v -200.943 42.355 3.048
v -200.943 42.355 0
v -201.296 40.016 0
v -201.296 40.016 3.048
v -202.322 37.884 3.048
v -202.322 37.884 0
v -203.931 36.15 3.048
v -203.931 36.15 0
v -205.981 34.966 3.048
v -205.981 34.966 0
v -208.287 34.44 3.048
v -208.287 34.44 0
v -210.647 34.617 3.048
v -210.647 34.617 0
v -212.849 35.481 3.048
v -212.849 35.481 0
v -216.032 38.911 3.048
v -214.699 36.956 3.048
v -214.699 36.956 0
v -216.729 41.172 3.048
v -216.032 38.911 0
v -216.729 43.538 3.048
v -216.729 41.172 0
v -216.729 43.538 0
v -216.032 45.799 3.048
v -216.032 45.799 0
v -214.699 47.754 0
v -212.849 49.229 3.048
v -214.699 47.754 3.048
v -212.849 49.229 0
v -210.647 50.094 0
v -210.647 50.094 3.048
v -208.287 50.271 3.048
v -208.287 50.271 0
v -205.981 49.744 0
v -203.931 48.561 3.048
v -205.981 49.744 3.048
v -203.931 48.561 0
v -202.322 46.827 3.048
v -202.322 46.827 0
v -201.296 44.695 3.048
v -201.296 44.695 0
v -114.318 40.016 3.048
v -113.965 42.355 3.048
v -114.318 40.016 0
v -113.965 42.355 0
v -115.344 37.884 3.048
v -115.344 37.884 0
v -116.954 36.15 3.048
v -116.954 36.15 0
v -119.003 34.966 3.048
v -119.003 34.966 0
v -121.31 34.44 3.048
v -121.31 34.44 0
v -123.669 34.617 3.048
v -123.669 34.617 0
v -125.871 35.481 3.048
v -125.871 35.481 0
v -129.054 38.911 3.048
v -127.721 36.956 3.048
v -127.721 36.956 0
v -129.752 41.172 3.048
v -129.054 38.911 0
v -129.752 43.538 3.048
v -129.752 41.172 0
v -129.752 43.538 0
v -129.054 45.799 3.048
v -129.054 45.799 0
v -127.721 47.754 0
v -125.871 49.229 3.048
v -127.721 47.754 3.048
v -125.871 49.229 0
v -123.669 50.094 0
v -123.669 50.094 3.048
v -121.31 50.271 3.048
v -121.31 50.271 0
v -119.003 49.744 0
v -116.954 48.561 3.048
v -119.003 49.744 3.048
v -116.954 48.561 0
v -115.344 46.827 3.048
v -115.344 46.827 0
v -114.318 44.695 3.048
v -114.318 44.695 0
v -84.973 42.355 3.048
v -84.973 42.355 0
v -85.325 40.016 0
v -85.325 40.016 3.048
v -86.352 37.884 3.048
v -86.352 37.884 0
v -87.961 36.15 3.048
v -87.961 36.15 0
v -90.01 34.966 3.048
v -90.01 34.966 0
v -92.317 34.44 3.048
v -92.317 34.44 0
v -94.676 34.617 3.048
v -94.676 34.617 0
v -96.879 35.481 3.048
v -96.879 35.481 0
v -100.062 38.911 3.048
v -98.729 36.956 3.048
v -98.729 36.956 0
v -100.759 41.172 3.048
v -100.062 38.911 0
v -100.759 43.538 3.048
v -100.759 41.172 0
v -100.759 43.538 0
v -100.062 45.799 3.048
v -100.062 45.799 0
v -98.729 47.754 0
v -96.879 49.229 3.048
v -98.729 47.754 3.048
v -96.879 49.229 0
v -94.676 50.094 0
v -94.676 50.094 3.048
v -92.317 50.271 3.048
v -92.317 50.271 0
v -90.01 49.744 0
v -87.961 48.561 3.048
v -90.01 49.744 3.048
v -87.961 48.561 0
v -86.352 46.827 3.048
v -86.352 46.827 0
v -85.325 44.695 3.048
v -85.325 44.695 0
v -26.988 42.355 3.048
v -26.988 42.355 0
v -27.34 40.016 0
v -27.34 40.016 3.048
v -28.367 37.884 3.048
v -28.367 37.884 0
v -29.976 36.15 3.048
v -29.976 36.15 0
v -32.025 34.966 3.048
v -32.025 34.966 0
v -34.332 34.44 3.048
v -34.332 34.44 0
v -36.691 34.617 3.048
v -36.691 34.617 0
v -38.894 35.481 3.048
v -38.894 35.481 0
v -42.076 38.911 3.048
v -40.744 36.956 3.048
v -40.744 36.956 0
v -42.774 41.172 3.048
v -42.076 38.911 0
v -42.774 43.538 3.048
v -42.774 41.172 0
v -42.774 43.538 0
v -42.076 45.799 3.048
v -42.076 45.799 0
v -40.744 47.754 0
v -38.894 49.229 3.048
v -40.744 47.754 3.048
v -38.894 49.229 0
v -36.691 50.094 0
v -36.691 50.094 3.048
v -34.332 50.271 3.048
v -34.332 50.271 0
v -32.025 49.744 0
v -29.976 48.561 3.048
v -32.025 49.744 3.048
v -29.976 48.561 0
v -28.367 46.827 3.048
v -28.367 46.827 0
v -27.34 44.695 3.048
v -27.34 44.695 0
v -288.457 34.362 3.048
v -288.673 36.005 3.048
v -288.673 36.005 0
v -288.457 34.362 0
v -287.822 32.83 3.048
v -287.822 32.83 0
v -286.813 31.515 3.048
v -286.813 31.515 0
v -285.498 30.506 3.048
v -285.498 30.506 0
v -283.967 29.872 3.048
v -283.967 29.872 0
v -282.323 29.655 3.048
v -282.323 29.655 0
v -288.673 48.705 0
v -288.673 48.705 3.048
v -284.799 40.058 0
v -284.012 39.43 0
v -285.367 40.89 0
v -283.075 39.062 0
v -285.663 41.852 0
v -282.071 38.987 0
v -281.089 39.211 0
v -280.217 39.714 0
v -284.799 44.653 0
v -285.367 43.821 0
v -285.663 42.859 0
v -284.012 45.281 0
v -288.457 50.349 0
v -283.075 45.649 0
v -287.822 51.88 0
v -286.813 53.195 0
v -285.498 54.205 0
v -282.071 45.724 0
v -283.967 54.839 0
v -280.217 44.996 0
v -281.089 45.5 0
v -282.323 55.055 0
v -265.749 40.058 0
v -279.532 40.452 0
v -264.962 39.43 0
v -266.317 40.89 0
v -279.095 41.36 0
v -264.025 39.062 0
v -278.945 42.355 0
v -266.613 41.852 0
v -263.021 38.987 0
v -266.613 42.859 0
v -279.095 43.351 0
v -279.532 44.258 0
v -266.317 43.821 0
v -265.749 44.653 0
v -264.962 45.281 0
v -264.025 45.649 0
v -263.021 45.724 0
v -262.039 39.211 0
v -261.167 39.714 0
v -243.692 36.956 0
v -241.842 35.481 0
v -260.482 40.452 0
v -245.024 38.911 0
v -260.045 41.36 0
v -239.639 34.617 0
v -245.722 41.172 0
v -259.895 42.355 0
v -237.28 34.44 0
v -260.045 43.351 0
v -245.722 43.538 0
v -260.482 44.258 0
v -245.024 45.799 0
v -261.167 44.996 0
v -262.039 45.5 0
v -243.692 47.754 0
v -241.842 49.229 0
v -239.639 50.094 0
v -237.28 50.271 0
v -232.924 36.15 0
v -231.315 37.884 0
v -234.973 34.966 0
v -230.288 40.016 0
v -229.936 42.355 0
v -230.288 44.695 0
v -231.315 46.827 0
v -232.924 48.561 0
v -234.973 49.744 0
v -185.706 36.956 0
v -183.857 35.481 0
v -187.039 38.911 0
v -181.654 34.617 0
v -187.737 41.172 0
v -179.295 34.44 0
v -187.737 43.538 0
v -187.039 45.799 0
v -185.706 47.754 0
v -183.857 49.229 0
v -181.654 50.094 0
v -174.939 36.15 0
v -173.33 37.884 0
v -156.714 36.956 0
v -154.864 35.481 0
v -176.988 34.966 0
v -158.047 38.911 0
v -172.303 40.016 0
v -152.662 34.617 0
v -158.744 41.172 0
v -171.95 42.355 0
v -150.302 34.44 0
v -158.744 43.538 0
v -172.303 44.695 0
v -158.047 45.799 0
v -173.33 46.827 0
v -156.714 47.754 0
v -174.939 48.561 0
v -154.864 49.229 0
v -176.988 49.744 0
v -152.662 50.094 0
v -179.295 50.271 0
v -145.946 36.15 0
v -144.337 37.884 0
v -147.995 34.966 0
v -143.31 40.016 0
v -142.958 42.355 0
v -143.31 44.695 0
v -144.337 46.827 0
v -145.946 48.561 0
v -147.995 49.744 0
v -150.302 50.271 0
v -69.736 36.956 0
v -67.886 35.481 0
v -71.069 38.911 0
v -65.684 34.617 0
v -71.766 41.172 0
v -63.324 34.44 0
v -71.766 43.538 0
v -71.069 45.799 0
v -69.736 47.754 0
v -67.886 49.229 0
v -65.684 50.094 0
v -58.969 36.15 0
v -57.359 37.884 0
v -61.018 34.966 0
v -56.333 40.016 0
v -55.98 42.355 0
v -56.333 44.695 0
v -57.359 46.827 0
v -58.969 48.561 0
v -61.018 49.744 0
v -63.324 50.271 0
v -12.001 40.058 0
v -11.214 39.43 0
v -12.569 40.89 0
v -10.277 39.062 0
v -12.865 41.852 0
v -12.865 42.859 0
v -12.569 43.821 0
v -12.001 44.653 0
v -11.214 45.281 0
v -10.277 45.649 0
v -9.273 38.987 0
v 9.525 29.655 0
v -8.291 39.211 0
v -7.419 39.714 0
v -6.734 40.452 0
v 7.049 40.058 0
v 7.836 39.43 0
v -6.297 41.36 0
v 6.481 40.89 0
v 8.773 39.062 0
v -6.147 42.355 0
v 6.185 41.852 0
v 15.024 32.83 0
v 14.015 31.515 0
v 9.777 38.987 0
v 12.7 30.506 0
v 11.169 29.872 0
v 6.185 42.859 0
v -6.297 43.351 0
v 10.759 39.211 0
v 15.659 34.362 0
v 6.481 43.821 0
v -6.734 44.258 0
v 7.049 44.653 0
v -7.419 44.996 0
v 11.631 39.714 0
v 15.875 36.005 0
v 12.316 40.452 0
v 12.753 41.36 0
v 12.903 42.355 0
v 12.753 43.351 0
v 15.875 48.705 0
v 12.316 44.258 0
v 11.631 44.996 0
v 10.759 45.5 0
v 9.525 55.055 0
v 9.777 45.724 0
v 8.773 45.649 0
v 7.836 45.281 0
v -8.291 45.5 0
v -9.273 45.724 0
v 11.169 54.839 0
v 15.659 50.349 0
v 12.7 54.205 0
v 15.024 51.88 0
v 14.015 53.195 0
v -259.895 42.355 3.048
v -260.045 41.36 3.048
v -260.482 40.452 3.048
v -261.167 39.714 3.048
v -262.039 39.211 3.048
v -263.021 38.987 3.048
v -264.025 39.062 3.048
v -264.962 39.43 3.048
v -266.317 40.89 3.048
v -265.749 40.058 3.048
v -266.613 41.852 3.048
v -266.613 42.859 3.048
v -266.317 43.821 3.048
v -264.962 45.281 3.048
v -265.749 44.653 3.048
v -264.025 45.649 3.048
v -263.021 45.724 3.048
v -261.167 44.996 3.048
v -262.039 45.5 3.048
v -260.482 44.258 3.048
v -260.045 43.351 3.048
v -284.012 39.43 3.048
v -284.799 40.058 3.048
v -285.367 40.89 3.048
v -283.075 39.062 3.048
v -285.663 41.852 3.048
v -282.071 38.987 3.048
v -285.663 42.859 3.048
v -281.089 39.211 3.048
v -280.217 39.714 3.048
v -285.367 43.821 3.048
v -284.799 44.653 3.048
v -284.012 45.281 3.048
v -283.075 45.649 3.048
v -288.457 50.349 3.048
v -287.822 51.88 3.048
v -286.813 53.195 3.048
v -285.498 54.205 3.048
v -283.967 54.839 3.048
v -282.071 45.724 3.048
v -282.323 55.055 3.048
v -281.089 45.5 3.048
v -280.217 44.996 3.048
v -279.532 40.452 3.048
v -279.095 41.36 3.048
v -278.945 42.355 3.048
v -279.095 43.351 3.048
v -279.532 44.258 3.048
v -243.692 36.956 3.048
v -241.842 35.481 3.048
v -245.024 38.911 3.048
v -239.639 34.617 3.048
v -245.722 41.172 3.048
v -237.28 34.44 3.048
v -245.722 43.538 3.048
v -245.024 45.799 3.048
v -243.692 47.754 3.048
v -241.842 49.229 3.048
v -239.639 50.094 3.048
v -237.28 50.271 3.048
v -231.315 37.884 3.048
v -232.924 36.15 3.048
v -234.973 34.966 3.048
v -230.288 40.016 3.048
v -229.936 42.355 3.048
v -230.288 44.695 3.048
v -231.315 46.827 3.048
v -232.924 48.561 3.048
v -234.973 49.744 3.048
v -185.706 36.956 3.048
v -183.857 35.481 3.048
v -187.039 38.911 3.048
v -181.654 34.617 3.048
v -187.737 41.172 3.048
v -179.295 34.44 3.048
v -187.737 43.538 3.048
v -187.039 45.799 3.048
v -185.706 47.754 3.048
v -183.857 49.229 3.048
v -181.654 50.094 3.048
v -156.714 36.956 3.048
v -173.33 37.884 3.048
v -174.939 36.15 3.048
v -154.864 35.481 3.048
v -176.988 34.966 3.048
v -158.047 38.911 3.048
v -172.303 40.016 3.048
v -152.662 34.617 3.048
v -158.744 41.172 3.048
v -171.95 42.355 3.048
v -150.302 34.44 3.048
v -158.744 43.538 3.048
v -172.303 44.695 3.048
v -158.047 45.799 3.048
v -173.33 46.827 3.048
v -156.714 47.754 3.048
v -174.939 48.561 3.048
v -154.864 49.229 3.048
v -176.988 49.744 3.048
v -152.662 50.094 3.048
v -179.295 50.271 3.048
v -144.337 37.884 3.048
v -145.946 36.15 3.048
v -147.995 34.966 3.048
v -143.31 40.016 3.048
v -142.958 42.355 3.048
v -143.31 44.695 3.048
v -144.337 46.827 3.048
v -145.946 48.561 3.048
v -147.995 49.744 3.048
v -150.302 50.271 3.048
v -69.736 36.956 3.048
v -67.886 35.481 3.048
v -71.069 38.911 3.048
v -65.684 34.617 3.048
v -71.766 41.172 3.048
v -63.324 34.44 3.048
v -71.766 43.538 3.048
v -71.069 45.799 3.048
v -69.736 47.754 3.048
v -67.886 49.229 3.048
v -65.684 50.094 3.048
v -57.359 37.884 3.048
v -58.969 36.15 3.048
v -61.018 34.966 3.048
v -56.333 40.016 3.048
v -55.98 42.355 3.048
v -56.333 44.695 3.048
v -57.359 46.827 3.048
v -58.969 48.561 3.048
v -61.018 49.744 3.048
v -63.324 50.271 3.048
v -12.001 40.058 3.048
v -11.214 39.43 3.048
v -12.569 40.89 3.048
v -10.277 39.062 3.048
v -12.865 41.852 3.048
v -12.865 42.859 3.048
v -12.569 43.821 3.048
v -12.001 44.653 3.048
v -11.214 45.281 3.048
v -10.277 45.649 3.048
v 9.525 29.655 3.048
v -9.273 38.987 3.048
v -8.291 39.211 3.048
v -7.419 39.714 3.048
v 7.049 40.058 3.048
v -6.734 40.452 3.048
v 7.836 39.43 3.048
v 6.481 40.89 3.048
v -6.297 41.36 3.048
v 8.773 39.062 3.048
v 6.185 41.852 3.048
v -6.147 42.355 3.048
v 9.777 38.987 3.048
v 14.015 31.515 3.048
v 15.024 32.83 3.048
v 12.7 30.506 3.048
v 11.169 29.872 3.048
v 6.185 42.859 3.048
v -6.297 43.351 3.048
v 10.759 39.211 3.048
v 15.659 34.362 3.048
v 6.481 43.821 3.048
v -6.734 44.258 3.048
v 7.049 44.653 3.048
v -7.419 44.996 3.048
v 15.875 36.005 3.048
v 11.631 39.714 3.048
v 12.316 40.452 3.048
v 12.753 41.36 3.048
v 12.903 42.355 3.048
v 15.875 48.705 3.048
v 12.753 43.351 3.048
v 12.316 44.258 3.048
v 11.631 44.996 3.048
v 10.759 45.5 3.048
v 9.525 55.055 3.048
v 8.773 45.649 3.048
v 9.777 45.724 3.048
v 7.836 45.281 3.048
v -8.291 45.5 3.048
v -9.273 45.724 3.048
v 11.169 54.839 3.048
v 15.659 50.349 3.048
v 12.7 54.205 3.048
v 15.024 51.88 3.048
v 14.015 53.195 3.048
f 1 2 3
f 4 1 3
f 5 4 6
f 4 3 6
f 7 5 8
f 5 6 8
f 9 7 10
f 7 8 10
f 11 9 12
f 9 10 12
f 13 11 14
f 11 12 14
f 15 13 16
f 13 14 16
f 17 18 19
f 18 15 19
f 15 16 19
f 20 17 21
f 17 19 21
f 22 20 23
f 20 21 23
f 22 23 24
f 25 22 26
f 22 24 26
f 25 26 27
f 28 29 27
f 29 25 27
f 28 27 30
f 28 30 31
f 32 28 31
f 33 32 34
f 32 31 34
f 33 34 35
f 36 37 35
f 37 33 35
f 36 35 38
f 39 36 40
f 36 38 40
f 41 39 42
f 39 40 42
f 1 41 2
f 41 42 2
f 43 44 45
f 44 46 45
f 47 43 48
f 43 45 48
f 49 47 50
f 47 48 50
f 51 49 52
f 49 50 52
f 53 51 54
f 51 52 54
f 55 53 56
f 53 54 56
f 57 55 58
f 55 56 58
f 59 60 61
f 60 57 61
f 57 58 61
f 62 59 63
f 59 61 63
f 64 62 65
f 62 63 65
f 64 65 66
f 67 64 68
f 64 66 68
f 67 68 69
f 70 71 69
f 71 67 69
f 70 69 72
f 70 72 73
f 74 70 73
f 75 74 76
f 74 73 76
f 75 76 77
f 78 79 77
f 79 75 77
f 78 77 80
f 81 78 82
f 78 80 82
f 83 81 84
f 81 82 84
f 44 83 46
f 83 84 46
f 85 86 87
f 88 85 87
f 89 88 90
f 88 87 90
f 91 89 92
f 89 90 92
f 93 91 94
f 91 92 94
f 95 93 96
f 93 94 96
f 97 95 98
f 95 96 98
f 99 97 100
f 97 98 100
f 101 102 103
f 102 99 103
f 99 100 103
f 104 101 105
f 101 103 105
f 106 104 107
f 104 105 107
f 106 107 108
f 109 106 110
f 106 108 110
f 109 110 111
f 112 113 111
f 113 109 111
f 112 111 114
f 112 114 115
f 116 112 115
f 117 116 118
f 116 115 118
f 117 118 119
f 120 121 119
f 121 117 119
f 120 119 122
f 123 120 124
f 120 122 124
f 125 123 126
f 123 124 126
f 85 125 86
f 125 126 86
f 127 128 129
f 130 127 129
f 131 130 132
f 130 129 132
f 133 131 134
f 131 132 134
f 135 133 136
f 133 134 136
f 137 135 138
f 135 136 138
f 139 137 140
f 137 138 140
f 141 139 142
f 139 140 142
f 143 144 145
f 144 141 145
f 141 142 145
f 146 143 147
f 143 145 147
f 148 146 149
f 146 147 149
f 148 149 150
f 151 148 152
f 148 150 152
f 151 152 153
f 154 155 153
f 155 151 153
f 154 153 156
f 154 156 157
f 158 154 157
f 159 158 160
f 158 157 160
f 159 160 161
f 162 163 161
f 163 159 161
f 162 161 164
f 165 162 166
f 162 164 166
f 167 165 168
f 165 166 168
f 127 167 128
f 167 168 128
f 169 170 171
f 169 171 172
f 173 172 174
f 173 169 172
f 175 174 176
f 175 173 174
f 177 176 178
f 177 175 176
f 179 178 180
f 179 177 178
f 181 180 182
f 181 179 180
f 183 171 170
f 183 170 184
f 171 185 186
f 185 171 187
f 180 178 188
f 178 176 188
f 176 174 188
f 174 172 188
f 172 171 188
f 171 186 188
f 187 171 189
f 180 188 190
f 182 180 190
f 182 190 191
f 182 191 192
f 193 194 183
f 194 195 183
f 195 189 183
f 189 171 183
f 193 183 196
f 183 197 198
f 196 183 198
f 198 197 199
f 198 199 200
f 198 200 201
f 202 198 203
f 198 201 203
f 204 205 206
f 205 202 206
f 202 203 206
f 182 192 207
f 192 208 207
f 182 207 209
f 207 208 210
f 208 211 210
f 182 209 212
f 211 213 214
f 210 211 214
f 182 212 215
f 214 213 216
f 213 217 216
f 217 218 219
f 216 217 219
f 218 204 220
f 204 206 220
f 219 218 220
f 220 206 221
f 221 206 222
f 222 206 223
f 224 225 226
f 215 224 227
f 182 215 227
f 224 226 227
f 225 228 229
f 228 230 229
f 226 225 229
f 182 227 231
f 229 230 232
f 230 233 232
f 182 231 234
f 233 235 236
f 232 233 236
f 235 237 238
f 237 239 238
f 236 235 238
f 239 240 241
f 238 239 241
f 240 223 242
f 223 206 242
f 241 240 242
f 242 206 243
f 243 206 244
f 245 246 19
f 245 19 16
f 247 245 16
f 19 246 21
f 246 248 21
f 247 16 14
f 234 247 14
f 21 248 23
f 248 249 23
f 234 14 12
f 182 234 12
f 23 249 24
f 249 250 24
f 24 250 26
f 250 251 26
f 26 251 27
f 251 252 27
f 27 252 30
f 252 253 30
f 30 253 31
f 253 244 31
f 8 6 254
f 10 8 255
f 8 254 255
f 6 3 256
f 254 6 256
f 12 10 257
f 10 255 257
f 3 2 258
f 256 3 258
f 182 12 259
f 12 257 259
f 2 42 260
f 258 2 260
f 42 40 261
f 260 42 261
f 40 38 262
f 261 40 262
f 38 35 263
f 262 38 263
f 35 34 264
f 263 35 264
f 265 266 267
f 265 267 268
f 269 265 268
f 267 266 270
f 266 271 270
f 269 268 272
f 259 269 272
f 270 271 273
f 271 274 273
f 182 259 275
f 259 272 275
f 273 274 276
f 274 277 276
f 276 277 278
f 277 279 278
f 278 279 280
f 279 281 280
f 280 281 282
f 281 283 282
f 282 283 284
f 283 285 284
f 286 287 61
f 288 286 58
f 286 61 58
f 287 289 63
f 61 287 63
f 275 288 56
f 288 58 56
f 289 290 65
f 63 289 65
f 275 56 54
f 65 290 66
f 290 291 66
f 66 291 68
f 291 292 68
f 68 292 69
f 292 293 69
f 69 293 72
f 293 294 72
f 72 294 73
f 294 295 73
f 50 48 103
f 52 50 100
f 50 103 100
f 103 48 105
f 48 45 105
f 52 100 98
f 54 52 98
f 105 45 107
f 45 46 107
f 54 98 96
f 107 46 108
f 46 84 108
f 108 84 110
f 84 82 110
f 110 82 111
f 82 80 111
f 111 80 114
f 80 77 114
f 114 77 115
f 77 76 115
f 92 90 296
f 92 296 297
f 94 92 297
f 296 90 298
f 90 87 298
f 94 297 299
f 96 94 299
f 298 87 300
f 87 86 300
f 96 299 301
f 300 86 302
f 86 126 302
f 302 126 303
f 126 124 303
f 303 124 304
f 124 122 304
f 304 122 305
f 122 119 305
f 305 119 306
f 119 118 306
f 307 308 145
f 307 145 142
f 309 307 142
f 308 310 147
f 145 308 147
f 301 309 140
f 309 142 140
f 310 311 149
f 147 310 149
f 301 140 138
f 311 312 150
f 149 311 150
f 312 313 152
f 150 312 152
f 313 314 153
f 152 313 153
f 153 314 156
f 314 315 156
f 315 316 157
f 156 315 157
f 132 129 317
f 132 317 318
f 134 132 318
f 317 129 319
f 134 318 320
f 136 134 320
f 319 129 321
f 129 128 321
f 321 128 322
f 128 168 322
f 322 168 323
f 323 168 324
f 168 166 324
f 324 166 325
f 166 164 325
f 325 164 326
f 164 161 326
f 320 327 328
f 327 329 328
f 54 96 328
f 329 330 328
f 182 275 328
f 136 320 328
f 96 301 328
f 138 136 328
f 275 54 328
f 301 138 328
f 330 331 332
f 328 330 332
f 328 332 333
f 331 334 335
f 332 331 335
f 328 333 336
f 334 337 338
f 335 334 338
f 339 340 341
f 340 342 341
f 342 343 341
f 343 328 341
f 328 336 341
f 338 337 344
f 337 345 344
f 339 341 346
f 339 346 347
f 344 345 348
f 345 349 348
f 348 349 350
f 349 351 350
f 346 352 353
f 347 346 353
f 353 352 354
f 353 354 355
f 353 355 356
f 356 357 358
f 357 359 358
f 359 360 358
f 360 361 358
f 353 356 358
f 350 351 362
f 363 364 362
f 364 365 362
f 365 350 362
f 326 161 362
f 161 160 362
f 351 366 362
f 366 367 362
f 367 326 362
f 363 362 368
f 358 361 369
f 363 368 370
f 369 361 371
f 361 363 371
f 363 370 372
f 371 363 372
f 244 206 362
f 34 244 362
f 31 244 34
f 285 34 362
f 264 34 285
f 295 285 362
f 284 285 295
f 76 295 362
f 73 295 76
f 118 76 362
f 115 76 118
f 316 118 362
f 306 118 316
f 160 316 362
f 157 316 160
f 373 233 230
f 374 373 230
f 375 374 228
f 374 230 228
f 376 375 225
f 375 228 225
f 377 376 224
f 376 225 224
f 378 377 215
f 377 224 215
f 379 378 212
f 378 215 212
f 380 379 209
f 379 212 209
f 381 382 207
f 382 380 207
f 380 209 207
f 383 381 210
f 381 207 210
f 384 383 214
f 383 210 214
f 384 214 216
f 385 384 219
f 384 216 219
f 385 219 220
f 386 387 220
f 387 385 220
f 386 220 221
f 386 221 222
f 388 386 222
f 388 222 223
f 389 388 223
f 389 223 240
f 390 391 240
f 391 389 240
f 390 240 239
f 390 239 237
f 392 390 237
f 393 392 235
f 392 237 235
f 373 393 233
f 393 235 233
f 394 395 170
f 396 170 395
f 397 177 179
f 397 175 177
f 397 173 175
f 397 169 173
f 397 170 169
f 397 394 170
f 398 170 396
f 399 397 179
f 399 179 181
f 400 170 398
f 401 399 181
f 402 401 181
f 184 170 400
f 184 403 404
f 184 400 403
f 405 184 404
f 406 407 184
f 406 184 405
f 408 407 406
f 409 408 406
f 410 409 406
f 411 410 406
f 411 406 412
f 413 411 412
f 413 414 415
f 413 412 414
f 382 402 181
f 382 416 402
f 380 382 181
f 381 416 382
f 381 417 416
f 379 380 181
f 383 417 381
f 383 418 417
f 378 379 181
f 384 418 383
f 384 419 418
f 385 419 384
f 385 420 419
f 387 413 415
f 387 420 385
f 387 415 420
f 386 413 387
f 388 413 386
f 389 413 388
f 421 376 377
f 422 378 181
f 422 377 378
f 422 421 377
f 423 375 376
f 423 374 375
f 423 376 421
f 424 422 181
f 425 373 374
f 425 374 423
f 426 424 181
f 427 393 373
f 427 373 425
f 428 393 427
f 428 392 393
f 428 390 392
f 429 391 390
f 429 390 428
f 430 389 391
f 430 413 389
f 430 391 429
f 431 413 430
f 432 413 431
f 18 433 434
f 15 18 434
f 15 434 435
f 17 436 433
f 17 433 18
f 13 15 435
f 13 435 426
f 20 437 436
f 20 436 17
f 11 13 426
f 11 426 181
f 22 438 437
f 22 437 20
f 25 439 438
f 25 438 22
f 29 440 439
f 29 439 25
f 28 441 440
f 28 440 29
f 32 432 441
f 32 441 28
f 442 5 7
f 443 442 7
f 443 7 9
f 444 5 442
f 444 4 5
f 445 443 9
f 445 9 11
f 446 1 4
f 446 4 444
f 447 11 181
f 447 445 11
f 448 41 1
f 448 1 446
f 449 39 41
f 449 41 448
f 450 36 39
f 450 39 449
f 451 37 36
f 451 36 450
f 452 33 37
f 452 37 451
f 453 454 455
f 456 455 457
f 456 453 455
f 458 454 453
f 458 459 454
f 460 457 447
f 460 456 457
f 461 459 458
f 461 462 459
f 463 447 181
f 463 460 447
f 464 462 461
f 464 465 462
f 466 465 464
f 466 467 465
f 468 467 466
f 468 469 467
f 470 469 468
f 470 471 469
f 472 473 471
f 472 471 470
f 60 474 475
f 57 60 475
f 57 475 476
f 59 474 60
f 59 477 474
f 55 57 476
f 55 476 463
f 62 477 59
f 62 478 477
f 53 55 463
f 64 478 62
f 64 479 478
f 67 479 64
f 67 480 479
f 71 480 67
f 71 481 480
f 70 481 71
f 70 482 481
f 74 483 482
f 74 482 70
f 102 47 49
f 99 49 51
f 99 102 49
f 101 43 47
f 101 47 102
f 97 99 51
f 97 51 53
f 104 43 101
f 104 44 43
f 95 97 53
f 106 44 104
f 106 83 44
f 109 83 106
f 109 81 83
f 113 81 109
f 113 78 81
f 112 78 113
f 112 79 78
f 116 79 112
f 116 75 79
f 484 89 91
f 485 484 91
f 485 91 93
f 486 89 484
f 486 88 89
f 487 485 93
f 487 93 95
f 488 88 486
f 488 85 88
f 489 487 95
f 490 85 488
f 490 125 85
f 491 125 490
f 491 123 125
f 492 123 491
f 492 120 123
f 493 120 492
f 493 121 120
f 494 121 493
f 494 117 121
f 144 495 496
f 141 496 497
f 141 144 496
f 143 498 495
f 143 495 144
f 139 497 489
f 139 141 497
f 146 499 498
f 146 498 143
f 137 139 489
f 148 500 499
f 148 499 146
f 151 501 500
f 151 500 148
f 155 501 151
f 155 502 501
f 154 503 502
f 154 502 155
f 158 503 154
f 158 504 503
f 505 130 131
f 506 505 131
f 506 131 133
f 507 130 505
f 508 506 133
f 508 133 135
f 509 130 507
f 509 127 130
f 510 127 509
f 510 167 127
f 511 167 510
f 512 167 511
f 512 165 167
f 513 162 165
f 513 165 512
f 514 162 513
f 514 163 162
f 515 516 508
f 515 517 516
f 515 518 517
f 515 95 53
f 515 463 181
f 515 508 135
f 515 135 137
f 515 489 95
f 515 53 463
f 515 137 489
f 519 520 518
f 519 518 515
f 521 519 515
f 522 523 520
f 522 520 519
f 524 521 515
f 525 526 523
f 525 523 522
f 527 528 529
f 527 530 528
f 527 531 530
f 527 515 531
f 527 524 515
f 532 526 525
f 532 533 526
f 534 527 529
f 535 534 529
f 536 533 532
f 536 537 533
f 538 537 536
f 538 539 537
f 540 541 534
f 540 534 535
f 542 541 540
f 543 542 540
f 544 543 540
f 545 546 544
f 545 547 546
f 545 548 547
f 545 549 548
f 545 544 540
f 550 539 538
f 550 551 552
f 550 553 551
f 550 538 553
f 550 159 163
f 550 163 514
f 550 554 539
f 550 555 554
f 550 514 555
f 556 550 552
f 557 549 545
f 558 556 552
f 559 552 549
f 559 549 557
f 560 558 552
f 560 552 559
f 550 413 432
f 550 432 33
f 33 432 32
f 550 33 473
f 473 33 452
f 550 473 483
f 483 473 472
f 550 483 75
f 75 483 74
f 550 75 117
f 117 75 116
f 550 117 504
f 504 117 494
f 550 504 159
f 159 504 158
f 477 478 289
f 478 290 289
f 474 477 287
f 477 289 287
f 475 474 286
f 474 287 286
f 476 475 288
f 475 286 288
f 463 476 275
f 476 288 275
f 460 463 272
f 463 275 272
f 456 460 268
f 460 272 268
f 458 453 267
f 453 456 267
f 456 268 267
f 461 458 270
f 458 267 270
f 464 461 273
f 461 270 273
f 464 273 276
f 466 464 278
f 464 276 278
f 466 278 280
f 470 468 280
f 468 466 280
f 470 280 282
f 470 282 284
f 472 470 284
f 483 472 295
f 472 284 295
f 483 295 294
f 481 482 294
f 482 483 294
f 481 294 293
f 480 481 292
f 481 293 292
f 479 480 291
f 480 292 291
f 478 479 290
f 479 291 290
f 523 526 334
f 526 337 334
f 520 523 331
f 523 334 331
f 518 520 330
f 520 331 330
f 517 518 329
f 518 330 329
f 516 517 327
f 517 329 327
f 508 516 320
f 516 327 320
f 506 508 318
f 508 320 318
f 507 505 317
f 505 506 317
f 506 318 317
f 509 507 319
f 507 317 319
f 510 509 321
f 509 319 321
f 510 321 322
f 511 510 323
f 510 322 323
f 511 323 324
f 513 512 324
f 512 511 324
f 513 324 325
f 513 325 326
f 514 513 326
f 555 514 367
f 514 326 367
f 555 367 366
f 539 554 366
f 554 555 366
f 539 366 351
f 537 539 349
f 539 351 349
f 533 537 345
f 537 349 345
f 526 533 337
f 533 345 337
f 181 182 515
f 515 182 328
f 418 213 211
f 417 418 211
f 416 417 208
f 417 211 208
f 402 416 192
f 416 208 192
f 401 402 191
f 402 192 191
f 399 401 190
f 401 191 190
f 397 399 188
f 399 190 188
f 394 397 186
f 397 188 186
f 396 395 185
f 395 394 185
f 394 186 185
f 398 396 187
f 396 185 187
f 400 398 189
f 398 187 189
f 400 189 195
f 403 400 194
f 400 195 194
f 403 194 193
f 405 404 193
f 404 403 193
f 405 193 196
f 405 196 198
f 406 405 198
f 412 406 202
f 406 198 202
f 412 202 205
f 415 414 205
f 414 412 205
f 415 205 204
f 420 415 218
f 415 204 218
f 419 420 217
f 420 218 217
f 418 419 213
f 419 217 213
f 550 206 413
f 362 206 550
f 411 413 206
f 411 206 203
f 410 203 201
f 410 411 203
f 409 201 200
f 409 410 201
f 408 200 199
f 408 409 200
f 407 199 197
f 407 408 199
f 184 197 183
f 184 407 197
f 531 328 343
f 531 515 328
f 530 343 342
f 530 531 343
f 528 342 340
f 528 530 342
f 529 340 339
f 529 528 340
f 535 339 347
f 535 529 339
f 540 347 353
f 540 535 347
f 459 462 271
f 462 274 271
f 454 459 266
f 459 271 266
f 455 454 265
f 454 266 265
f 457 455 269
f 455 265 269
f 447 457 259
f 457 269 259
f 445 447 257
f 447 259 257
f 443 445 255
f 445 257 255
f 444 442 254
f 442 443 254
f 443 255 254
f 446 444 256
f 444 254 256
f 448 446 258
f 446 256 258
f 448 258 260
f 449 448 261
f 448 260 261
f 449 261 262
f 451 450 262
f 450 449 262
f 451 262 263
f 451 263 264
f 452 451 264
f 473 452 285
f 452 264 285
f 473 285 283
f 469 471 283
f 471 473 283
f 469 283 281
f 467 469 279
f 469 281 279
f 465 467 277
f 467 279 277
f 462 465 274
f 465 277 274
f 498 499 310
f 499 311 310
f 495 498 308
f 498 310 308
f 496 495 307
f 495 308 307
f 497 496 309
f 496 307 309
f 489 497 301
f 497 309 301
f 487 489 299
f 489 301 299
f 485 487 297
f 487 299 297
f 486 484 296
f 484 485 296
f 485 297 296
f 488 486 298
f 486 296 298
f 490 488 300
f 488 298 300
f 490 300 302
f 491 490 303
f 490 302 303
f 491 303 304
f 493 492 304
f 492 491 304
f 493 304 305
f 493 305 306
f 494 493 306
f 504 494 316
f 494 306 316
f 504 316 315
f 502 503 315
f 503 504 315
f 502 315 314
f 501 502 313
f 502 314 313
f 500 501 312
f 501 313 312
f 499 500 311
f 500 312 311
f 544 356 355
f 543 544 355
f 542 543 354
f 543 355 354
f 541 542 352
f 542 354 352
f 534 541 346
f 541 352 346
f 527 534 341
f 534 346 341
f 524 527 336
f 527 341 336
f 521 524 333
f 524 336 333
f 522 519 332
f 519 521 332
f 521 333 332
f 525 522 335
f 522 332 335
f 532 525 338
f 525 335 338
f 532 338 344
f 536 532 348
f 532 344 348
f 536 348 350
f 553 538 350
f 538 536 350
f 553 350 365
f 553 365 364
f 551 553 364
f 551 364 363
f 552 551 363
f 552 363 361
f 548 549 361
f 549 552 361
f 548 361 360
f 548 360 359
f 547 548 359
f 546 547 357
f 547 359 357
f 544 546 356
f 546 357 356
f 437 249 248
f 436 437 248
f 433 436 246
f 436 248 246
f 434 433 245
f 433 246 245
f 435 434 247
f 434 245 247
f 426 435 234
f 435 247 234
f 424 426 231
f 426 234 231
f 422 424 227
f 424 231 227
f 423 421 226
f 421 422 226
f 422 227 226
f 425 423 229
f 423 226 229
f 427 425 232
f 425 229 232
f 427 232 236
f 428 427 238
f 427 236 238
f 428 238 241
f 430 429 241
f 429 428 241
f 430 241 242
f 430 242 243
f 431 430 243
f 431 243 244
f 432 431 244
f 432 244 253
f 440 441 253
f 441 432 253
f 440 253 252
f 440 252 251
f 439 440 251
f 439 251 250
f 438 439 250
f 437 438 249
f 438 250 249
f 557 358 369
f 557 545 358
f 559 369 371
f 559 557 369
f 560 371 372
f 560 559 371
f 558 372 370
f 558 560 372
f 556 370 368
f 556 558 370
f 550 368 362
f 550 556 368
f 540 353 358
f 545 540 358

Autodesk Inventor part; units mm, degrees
ref_plane "YZ Plane" through (0, 0, 0) normal (1, 0, 0) x (0, 1, 0)
ref_plane "XZ Plane" through (0, 0, 0) normal (0, 1, 0) x (-1, 0, 0)
ref_plane "XY Plane" through (0, 0, 0) normal (0, 0, 1) x (1, 0, 0)
sketch "Sketch1" plane through (0, 0, 0) normal (0, 0, 1) x (1, 0, 0)
  arc A0 (-9.525, 55.0553) -> (-15.875, 48.7053) centre (-9.525, 48.7053) ccw construction
  line L0 (-15.875, 19.05) -> (-15.875, 48.7053) construction
  line L1 (-15.875, 19.05) -> (15.875, 19.05) construction
  line L2 (15.875, 48.7053) -> (15.875, 19.05) construction
  arc A1 (15.875, 48.7053) -> (9.525, 55.0553) centre (9.525, 48.7053) ccw construction
  line L3 (-9.525, 55.0553) -> (9.525, 55.0553) construction
  circle A2 centre (9.525, 42.3553) radius 3.3782 projected
  circle A3 centre (-9.525, 42.3553) radius 3.3782 projected
  arc A4 (-256.923, 48.7053) -> (-263.273, 55.0553) centre (-263.273, 48.7053) ccw construction
  line L4 (-282.323, 55.0553) -> (-263.273, 55.0553) construction
  arc A5 (-282.323, 55.0553) -> (-288.673, 48.7053) centre (-282.323, 48.7053) ccw construction
  line L5 (-288.673, 19.05) -> (-288.673, 48.7053) construction
  line L6 (-288.673, 19.05) -> (-256.923, 19.05) construction
  line L7 (-256.923, 48.7053) -> (-256.923, 19.05) construction
  circle A6 centre (-263.273, 42.3553) radius 3.3782 projected
  circle A7 centre (-282.323, 42.3553) radius 3.3782 projected
  line L8 (-288.673, 55.0553) -> (15.875, 55.0553)
  line L9 (-288.673, 29.6553) -> (15.875, 29.6553)
  line L10 (-288.673, 29.6553) -> (-288.673, 55.0553)
  line L11 (15.875, 29.6553) -> (15.875, 55.0553)
  line L12 (-288.673, 42.3553) -> (15.875, 42.3553) construction
  circle A8 centre (-237.873, 42.3553) radius 7.9375
  circle A9 centre (-208.8804, 42.3553) radius 7.9375
  circle A10 centre (-179.8879, 42.3553) radius 7.9375
  circle A11 centre (-150.8953, 42.3553) radius 7.9375
  circle A12 centre (-121.9027, 42.3553) radius 7.9375
  circle A13 centre (-92.9101, 42.3553) radius 7.9375
  circle A14 centre (-63.9176, 42.3553) radius 7.9375
  circle A15 centre (-34.925, 42.3553) radius 7.9375
  point P0 (0, 0)
  dimension "d1" = 25.4
  dimension "d2" = 12.7
  dimension "d33" = 15.875
  dimension "d35" = 304.548
  dimension "d36" = 50.8
  dimension "d39" = 28.9926
extrude "Plate1" add sketch "Sketch1" along normal blind 3.048
fillet "Corner Round1" radius 6.35 4 edges at (-288.673, 29.6553, 1.524) (-288.673, 55.0553, 1.524) (15.875, 29.6553, 1.524) (15.875, 55.0553, 1.524)
equation "\"d39\" = -0.285714 * d36 + 0.142857 * d35"
equation "\"BendRadius\" = Thickness"
equation "\"BendReliefWidth\" = Thickness"
equation "\"BendReliefDepth\" = 0.5 * Thickness"
equation "\"CornerReliefSize\" = 4 * Thickness"
equation "\"MinimumRemnant\" = 2 * Thickness"
equation "\"TransitionRadius\" = BendRadius"
equation "\"JacobiRadiusSize\" = BendRadius"
equation "\"GapSize\" = Thickness"
equation "\"d3\" = BendRadius"
equation "\"Thickness\" = 3.048"
properties part number "V5 Shooter Frame Channel P7" material "Aluminum-6061"
